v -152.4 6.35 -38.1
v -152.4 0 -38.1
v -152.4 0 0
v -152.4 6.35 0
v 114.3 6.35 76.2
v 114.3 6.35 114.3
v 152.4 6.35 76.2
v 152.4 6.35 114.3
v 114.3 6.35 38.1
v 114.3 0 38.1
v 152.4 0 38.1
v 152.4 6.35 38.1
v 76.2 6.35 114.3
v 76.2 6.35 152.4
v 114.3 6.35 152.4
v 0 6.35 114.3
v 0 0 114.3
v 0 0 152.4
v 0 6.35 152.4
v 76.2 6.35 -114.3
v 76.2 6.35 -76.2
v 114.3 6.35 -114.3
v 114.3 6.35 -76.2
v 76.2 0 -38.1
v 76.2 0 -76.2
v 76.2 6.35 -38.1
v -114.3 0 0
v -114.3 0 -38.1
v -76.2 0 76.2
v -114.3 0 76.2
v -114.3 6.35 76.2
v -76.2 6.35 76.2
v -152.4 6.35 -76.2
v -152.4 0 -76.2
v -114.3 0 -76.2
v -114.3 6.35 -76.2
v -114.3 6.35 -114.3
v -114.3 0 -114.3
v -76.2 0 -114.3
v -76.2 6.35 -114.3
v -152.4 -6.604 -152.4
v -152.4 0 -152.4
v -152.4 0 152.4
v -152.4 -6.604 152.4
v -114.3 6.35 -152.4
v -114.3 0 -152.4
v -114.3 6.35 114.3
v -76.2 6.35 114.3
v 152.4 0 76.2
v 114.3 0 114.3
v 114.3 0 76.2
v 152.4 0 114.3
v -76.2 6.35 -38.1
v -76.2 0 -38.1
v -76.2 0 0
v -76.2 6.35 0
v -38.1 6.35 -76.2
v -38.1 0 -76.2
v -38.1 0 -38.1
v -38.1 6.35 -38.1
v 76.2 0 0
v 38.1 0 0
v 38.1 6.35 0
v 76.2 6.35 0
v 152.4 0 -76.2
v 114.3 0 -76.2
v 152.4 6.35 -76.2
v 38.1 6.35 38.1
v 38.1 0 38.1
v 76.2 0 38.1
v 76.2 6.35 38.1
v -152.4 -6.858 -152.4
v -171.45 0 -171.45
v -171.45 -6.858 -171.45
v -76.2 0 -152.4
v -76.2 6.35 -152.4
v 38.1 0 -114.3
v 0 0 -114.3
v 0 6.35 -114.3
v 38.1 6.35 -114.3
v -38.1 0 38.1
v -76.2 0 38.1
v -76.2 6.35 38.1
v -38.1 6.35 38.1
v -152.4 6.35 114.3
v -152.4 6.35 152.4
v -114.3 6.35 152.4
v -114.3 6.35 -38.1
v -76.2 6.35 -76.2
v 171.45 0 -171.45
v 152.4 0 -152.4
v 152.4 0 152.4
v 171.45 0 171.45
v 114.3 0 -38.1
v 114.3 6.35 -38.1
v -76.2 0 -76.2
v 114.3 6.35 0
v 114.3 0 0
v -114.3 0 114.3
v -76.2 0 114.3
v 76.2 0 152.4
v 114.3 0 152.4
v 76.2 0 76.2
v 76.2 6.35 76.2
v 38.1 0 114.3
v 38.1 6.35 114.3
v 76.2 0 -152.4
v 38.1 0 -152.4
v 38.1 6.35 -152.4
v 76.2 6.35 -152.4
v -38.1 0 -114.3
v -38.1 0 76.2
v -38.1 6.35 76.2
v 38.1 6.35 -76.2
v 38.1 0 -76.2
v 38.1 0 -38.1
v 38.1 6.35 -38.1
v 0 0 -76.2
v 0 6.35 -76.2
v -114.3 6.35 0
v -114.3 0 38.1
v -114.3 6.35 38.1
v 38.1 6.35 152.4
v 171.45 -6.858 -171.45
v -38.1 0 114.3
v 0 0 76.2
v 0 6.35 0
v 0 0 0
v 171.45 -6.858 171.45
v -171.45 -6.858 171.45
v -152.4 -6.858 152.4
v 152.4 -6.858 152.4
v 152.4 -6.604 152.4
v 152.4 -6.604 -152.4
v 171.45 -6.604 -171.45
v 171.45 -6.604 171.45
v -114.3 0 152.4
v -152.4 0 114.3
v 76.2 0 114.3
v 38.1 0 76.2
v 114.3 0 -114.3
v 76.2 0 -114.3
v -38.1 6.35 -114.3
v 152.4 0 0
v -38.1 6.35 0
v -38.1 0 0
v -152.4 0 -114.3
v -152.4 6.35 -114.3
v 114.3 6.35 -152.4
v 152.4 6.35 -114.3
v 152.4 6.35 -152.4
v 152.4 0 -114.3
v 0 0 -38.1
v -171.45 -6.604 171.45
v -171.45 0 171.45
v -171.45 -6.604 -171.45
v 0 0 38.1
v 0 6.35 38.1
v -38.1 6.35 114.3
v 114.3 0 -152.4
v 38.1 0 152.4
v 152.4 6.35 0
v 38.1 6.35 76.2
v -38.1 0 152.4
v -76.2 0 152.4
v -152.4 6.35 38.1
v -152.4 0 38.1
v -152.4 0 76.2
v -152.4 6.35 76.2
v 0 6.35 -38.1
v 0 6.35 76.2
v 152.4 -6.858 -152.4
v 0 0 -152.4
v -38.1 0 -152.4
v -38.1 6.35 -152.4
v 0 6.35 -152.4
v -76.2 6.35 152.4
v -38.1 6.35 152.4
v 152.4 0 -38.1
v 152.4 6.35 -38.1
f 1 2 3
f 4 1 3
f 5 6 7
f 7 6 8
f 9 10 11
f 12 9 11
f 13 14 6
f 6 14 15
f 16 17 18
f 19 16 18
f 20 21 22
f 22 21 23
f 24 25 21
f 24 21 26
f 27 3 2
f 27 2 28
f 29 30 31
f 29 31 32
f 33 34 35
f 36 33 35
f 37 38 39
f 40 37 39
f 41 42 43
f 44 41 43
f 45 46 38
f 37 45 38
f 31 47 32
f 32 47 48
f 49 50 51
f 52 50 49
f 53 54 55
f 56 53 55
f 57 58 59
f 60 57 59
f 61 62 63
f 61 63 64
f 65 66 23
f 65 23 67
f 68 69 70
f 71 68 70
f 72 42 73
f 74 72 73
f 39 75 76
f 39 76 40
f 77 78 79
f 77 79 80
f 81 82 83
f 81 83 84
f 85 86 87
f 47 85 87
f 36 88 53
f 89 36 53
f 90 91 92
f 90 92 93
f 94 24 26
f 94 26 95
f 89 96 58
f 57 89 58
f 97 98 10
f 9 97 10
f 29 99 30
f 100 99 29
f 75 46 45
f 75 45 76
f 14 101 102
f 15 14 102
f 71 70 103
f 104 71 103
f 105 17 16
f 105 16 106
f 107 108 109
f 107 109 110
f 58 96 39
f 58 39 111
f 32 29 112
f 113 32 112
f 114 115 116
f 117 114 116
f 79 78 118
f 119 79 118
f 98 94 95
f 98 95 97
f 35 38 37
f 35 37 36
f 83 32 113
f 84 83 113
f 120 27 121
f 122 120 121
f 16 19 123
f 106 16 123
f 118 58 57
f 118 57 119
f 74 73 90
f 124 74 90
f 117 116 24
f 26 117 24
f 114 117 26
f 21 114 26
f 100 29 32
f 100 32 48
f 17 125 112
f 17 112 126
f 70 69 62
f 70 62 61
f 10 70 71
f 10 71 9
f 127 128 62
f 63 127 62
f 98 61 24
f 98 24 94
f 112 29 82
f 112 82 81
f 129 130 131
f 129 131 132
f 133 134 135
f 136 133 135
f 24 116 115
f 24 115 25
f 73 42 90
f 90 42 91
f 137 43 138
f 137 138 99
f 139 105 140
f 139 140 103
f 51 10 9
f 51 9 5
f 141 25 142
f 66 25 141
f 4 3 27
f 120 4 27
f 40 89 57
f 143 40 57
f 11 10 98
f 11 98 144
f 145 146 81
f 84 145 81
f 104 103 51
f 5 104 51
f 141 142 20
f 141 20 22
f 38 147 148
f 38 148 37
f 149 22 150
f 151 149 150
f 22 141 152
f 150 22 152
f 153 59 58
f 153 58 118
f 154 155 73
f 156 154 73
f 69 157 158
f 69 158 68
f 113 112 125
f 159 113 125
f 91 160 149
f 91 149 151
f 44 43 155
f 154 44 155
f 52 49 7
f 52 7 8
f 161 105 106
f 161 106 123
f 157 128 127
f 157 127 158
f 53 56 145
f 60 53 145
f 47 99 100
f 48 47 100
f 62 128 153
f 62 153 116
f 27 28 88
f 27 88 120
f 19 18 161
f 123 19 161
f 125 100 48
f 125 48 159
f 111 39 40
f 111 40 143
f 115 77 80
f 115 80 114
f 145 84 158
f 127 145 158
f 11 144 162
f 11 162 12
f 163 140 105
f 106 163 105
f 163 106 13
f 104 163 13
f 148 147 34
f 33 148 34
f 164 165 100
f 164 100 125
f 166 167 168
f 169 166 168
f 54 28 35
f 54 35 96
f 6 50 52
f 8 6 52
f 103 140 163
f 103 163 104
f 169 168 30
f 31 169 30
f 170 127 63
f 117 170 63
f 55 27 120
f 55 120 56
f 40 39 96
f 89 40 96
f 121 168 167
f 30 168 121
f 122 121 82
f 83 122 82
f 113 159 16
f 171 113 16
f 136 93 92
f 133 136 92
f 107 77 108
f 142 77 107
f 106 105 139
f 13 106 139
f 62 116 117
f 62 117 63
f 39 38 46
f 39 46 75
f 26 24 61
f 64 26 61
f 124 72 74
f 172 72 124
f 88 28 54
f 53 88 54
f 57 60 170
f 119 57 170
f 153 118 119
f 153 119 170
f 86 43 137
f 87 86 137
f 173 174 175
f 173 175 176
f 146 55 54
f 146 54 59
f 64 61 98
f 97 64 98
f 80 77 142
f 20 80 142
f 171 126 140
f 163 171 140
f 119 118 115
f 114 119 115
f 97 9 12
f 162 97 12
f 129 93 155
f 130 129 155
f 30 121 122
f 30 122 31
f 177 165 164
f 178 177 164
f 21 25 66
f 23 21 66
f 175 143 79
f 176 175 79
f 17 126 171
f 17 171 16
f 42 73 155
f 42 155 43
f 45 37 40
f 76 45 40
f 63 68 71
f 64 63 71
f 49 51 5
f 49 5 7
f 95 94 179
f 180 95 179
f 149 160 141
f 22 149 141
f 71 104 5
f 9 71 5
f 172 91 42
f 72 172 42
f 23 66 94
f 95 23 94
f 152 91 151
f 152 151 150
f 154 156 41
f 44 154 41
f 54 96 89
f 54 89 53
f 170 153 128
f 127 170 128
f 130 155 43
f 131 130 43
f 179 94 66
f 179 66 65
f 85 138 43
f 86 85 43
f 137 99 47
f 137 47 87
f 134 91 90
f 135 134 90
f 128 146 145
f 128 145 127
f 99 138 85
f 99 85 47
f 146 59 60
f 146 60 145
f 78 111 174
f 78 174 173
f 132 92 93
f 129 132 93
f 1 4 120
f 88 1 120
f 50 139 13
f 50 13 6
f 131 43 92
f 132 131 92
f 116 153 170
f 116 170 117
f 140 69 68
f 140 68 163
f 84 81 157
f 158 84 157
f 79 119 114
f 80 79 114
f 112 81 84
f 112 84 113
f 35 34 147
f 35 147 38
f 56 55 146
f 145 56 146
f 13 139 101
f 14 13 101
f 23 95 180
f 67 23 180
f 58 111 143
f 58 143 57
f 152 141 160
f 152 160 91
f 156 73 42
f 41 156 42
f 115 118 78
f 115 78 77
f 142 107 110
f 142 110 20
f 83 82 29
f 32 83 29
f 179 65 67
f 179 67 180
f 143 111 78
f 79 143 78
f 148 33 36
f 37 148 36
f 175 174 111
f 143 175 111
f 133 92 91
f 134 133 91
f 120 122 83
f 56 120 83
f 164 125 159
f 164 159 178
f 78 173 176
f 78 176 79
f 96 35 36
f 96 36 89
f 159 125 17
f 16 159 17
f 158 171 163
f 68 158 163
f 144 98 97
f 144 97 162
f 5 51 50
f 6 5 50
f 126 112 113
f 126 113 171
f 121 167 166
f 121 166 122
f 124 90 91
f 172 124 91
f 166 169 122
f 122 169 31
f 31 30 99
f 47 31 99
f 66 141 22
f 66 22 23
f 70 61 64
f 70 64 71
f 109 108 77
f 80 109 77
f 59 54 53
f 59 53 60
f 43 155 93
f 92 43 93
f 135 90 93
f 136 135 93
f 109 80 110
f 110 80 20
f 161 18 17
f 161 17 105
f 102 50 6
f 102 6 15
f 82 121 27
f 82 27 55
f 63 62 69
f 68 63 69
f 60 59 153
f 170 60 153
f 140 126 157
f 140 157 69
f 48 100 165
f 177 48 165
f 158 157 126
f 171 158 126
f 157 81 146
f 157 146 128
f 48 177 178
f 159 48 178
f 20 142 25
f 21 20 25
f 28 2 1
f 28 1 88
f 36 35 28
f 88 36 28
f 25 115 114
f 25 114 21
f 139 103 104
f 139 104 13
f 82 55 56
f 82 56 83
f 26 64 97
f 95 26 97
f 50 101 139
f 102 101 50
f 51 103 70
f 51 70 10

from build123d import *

# Parameters (mm, degrees)
F0_W     = 38.1
F0_H     = 38.1
F1_DEPTH = 6.35
F2_DEPTH = 6.604
F3_DEPTH = 6.858


with BuildPart() as f1:
    # F0 (on Front) → F1 (new body)
    with BuildSketch(Plane.XZ):
        with Locations((-133.35, 57.15)):
            Rectangle(F0_W, F0_H)
    extrude(amount=-F1_DEPTH)


with BuildPart() as f1b:
    # F0 (on Front) → F1, piece 2 (new body)
    with BuildSketch(Plane.XZ):
        with Locations((-95.25, 95.25)):
            Rectangle(F0_W, F0_H)
    extrude(amount=-F1_DEPTH)


with BuildPart() as f1c:
    # F0 (on Front) → F1, piece 3 (new body)
    with BuildSketch(Plane.XZ):
        with Locations((-57.15, 57.15)):
            Rectangle(F0_W, F0_H)
    extrude(amount=-F1_DEPTH)


with BuildPart() as f1d:
    # F0 (on Front) → F1, piece 4 (new body)
    with BuildSketch(Plane.XZ):
        with Locations((-57.15, 133.35)):
            Rectangle(F0_W, F0_H)
    extrude(amount=-F1_DEPTH)


with BuildPart() as f1e:
    # F0 (on Front) → F1, piece 5 (new body)
    with BuildSketch(Plane.XZ):
        with Locations((19.05, 133.35)):
            Rectangle(F0_W, F0_H)
    extrude(amount=-F1_DEPTH)


with BuildPart() as f1f:
    # F0 (on Front) → F1, piece 6 (new body)
    with BuildSketch(Plane.XZ):
        with Locations((19.05, 57.15)):
            Rectangle(F0_W, F0_H)
    extrude(amount=-F1_DEPTH)


with BuildPart() as f1g:
    # F0 (on Front) → F1, piece 7 (new body)
    with BuildSketch(Plane.XZ):
        with Locations((-19.05, 95.25)):
            Rectangle(F0_W, F0_H)
    extrude(amount=-F1_DEPTH)


with BuildPart() as f1h:
    # F0 (on Front) → F1, piece 8 (new body)
    with BuildSketch(Plane.XZ):
        with Locations((57.15, 95.25)):
            Rectangle(F0_W, F0_H)
    extrude(amount=-F1_DEPTH)


with BuildPart() as f1i:
    # F0 (on Front) → F1, piece 9 (new body)
    with BuildSketch(Plane.XZ):
        with Locations((133.35, 95.25)):
            Rectangle(F0_W, F0_H)
    extrude(amount=-F1_DEPTH)


with BuildPart() as f1j:
    # F0 (on Front) → F1, piece 10 (new body)
    with BuildSketch(Plane.XZ):
        with Locations((95.25, 133.35)):
            Rectangle(F0_W, F0_H)
    extrude(amount=-F1_DEPTH)


with BuildPart() as f1k:
    # F0 (on Front) → F1, piece 11 (new body)
    with BuildSketch(Plane.XZ):
        with Locations((95.25, 57.15)):
            Rectangle(F0_W, F0_H)
    extrude(amount=-F1_DEPTH)


with BuildPart() as f1l:
    # F0 (on Front) → F1, piece 12 (new body)
    with BuildSketch(Plane.XZ):
        with Locations((-133.35, -19.05)):
            Rectangle(F0_W, F0_H)
    extrude(amount=-F1_DEPTH)


with BuildPart() as f1m:
    # F0 (on Front) → F1, piece 13 (new body)
    with BuildSketch(Plane.XZ):
        with Locations((-133.35, -95.25)):
            Rectangle(F0_W, F0_H)
    extrude(amount=-F1_DEPTH)


with BuildPart() as f1n:
    # F0 (on Front) → F1, piece 14 (new body)
    with BuildSketch(Plane.XZ):
        with Locations((-95.25, -133.35)):
            Rectangle(F0_W, F0_H)
    extrude(amount=-F1_DEPTH)


with BuildPart() as f1o:
    # F0 (on Front) → F1, piece 15 (new body)
    with BuildSketch(Plane.XZ):
        with Locations((-95.25, -57.15)):
            Rectangle(F0_W, F0_H)
    extrude(amount=-F1_DEPTH)


with BuildPart() as f1p:
    # F0 (on Front) → F1, piece 16 (new body)
    with BuildSketch(Plane.XZ):
        with Locations((-95.25, 19.05)):
            Rectangle(F0_W, F0_H)
    extrude(amount=-F1_DEPTH)


with BuildPart() as f1q:
    # F0 (on Front) → F1, piece 17 (new body)
    with BuildSketch(Plane.XZ):
        with Locations((-57.15, -19.05)):
            Rectangle(F0_W, F0_H)
    extrude(amount=-F1_DEPTH)


with BuildPart() as f1r:
    # F0 (on Front) → F1, piece 18 (new body)
    with BuildSketch(Plane.XZ):
        with Locations((-57.15, -95.25)):
            Rectangle(F0_W, F0_H)
    extrude(amount=-F1_DEPTH)


with BuildPart() as f1s:
    # F0 (on Front) → F1, piece 19 (new body)
    with BuildSketch(Plane.XZ):
        with Locations((-19.05, -57.15)):
            Rectangle(F0_W, F0_H)
    extrude(amount=-F1_DEPTH)


with BuildPart() as f1t:
    # F0 (on Front) → F1, piece 20 (new body)
    with BuildSketch(Plane.XZ):
        with Locations((-19.05, 19.05)):
            Rectangle(F0_W, F0_H)
    extrude(amount=-F1_DEPTH)


with BuildPart() as f1u:
    # F0 (on Front) → F1, piece 21 (new body)
    with BuildSketch(Plane.XZ):
        with Locations((19.05, -19.05)):
            Rectangle(F0_W, F0_H)
    extrude(amount=-F1_DEPTH)


with BuildPart() as f1v:
    # F0 (on Front) → F1, piece 22 (new body)
    with BuildSketch(Plane.XZ):
        with Locations((19.05, -95.25)):
            Rectangle(F0_W, F0_H)
    extrude(amount=-F1_DEPTH)


with BuildPart() as f1w:
    # F0 (on Front) → F1, piece 23 (new body)
    with BuildSketch(Plane.XZ):
        with Locations((57.15, -133.35)):
            Rectangle(F0_W, F0_H)
    extrude(amount=-F1_DEPTH)


with BuildPart() as f1x:
    # F0 (on Front) → F1, piece 24 (new body)
    with BuildSketch(Plane.XZ):
        with Locations((57.15, -57.15)):
            Rectangle(F0_W, F0_H)
    extrude(amount=-F1_DEPTH)


with BuildPart() as f1y:
    # F0 (on Front) → F1, piece 25 (new body)
    with BuildSketch(Plane.XZ):
        with Locations((57.15, 19.05)):
            Rectangle(F0_W, F0_H)
    extrude(amount=-F1_DEPTH)


with BuildPart() as f1z:
    # F0 (on Front) → F1, piece 26 (new body)
    with BuildSketch(Plane.XZ):
        with Locations((95.25, -19.05)):
            Rectangle(F0_W, F0_H)
    extrude(amount=-F1_DEPTH)


with BuildPart() as f1ba:
    # F0 (on Front) → F1, piece 27 (new body)
    with BuildSketch(Plane.XZ):
        with Locations((95.25, -95.25)):
            Rectangle(F0_W, F0_H)
    extrude(amount=-F1_DEPTH)


with BuildPart() as f1bb:
    # F0 (on Front) → F1, piece 28 (new body)
    with BuildSketch(Plane.XZ):
        with Locations((133.35, -57.15)):
            Rectangle(F0_W, F0_H)
    extrude(amount=-F1_DEPTH)


with BuildPart() as f1bc:
    # F0 (on Front) → F1, piece 29 (new body)
    with BuildSketch(Plane.XZ):
        with Locations((133.35, 19.05)):
            Rectangle(F0_W, F0_H)
    extrude(amount=-F1_DEPTH)


with BuildPart() as f1bd:
    # F0 (on Front) → F1, piece 30 (new body)
    with BuildSketch(Plane.XZ):
        with Locations((133.35, -133.35)):
            Rectangle(F0_W, F0_H)
    extrude(amount=-F1_DEPTH)


with BuildPart() as f1be:
    # F0 (on Front) → F1, piece 31 (new body)
    with BuildSketch(Plane.XZ):
        with Locations((-19.05, -133.35)):
            Rectangle(F0_W, F0_H)
    extrude(amount=-F1_DEPTH)


with BuildPart() as f1bf:
    # F0 (on Front) → F1, piece 32 (new body)
    with BuildSketch(Plane.XZ):
        with Locations((-133.35, 133.35)):
            Rectangle(F0_W, F0_H)
    extrude(amount=-F1_DEPTH)


with BuildPart() as f2:
    # F0 (on Front) → F2 (new body)
    with BuildSketch(Plane.XZ):
        Polygon((-152.4, 152.4), (-171.45, 171.45), (-171.45, -171.45), (-152.4, -152.4), (-152.4, -114.3), (-152.4, -76.2), (-152.4, -38.1), (-152.4, 0), (-152.4, 38.1), (-152.4, 76.2), (-152.4, 114.3), align=None)
    extrude(amount=F2_DEPTH)


with BuildPart() as f2b:
    # F0 (on Front) → F2, piece 2 (new body)
    with BuildSketch(Plane.XZ):
        Polygon((171.45, -171.45), (171.45, 171.45), (152.4, 152.4), (152.4, 114.3), (152.4, 76.2), (152.4, 38.1), (152.4, 0), (152.4, -38.1), (152.4, -76.2), (152.4, -114.3), (152.4, -152.4), align=None)
    extrude(amount=F2_DEPTH)


with BuildPart() as f3:
    # F0 (on Front) → F3 (new body)
    with BuildSketch(Plane.XZ):
        Polygon((-152.4, -152.4), (-171.45, -171.45), (171.45, -171.45), (152.4, -152.4), (114.3, -152.4), (76.2, -152.4), (38.1, -152.4), (0, -152.4), (-38.1, -152.4), (-76.2, -152.4), (-114.3, -152.4), align=None)
    extrude(amount=F3_DEPTH)


with BuildPart() as f3b:
    # F0 (on Front) → F3, piece 2 (new body)
    with BuildSketch(Plane.XZ):
        Polygon((171.45, 171.45), (-171.45, 171.45), (-152.4, 152.4), (-114.3, 152.4), (-76.2, 152.4), (-38.1, 152.4), (0, 152.4), (38.1, 152.4), (76.2, 152.4), (114.3, 152.4), (152.4, 152.4), align=None)
    extrude(amount=F3_DEPTH)


solid = Compound([f1.part, f1b.part, f1c.part, f1d.part, f1e.part, f1f.part, f1g.part, f1h.part, f1i.part, f1j.part, f1k.part, f1l.part, f1m.part, f1n.part, f1o.part, f1p.part, f1q.part, f1r.part, f1s.part, f1t.part, f1u.part, f1v.part, f1w.part, f1x.part, f1y.part, f1z.part, f1ba.part, f1bb.part, f1bc.part, f1bd.part, f1be.part, f1bf.part, f2.part, f2b.part, f3.part, f3b.part])
